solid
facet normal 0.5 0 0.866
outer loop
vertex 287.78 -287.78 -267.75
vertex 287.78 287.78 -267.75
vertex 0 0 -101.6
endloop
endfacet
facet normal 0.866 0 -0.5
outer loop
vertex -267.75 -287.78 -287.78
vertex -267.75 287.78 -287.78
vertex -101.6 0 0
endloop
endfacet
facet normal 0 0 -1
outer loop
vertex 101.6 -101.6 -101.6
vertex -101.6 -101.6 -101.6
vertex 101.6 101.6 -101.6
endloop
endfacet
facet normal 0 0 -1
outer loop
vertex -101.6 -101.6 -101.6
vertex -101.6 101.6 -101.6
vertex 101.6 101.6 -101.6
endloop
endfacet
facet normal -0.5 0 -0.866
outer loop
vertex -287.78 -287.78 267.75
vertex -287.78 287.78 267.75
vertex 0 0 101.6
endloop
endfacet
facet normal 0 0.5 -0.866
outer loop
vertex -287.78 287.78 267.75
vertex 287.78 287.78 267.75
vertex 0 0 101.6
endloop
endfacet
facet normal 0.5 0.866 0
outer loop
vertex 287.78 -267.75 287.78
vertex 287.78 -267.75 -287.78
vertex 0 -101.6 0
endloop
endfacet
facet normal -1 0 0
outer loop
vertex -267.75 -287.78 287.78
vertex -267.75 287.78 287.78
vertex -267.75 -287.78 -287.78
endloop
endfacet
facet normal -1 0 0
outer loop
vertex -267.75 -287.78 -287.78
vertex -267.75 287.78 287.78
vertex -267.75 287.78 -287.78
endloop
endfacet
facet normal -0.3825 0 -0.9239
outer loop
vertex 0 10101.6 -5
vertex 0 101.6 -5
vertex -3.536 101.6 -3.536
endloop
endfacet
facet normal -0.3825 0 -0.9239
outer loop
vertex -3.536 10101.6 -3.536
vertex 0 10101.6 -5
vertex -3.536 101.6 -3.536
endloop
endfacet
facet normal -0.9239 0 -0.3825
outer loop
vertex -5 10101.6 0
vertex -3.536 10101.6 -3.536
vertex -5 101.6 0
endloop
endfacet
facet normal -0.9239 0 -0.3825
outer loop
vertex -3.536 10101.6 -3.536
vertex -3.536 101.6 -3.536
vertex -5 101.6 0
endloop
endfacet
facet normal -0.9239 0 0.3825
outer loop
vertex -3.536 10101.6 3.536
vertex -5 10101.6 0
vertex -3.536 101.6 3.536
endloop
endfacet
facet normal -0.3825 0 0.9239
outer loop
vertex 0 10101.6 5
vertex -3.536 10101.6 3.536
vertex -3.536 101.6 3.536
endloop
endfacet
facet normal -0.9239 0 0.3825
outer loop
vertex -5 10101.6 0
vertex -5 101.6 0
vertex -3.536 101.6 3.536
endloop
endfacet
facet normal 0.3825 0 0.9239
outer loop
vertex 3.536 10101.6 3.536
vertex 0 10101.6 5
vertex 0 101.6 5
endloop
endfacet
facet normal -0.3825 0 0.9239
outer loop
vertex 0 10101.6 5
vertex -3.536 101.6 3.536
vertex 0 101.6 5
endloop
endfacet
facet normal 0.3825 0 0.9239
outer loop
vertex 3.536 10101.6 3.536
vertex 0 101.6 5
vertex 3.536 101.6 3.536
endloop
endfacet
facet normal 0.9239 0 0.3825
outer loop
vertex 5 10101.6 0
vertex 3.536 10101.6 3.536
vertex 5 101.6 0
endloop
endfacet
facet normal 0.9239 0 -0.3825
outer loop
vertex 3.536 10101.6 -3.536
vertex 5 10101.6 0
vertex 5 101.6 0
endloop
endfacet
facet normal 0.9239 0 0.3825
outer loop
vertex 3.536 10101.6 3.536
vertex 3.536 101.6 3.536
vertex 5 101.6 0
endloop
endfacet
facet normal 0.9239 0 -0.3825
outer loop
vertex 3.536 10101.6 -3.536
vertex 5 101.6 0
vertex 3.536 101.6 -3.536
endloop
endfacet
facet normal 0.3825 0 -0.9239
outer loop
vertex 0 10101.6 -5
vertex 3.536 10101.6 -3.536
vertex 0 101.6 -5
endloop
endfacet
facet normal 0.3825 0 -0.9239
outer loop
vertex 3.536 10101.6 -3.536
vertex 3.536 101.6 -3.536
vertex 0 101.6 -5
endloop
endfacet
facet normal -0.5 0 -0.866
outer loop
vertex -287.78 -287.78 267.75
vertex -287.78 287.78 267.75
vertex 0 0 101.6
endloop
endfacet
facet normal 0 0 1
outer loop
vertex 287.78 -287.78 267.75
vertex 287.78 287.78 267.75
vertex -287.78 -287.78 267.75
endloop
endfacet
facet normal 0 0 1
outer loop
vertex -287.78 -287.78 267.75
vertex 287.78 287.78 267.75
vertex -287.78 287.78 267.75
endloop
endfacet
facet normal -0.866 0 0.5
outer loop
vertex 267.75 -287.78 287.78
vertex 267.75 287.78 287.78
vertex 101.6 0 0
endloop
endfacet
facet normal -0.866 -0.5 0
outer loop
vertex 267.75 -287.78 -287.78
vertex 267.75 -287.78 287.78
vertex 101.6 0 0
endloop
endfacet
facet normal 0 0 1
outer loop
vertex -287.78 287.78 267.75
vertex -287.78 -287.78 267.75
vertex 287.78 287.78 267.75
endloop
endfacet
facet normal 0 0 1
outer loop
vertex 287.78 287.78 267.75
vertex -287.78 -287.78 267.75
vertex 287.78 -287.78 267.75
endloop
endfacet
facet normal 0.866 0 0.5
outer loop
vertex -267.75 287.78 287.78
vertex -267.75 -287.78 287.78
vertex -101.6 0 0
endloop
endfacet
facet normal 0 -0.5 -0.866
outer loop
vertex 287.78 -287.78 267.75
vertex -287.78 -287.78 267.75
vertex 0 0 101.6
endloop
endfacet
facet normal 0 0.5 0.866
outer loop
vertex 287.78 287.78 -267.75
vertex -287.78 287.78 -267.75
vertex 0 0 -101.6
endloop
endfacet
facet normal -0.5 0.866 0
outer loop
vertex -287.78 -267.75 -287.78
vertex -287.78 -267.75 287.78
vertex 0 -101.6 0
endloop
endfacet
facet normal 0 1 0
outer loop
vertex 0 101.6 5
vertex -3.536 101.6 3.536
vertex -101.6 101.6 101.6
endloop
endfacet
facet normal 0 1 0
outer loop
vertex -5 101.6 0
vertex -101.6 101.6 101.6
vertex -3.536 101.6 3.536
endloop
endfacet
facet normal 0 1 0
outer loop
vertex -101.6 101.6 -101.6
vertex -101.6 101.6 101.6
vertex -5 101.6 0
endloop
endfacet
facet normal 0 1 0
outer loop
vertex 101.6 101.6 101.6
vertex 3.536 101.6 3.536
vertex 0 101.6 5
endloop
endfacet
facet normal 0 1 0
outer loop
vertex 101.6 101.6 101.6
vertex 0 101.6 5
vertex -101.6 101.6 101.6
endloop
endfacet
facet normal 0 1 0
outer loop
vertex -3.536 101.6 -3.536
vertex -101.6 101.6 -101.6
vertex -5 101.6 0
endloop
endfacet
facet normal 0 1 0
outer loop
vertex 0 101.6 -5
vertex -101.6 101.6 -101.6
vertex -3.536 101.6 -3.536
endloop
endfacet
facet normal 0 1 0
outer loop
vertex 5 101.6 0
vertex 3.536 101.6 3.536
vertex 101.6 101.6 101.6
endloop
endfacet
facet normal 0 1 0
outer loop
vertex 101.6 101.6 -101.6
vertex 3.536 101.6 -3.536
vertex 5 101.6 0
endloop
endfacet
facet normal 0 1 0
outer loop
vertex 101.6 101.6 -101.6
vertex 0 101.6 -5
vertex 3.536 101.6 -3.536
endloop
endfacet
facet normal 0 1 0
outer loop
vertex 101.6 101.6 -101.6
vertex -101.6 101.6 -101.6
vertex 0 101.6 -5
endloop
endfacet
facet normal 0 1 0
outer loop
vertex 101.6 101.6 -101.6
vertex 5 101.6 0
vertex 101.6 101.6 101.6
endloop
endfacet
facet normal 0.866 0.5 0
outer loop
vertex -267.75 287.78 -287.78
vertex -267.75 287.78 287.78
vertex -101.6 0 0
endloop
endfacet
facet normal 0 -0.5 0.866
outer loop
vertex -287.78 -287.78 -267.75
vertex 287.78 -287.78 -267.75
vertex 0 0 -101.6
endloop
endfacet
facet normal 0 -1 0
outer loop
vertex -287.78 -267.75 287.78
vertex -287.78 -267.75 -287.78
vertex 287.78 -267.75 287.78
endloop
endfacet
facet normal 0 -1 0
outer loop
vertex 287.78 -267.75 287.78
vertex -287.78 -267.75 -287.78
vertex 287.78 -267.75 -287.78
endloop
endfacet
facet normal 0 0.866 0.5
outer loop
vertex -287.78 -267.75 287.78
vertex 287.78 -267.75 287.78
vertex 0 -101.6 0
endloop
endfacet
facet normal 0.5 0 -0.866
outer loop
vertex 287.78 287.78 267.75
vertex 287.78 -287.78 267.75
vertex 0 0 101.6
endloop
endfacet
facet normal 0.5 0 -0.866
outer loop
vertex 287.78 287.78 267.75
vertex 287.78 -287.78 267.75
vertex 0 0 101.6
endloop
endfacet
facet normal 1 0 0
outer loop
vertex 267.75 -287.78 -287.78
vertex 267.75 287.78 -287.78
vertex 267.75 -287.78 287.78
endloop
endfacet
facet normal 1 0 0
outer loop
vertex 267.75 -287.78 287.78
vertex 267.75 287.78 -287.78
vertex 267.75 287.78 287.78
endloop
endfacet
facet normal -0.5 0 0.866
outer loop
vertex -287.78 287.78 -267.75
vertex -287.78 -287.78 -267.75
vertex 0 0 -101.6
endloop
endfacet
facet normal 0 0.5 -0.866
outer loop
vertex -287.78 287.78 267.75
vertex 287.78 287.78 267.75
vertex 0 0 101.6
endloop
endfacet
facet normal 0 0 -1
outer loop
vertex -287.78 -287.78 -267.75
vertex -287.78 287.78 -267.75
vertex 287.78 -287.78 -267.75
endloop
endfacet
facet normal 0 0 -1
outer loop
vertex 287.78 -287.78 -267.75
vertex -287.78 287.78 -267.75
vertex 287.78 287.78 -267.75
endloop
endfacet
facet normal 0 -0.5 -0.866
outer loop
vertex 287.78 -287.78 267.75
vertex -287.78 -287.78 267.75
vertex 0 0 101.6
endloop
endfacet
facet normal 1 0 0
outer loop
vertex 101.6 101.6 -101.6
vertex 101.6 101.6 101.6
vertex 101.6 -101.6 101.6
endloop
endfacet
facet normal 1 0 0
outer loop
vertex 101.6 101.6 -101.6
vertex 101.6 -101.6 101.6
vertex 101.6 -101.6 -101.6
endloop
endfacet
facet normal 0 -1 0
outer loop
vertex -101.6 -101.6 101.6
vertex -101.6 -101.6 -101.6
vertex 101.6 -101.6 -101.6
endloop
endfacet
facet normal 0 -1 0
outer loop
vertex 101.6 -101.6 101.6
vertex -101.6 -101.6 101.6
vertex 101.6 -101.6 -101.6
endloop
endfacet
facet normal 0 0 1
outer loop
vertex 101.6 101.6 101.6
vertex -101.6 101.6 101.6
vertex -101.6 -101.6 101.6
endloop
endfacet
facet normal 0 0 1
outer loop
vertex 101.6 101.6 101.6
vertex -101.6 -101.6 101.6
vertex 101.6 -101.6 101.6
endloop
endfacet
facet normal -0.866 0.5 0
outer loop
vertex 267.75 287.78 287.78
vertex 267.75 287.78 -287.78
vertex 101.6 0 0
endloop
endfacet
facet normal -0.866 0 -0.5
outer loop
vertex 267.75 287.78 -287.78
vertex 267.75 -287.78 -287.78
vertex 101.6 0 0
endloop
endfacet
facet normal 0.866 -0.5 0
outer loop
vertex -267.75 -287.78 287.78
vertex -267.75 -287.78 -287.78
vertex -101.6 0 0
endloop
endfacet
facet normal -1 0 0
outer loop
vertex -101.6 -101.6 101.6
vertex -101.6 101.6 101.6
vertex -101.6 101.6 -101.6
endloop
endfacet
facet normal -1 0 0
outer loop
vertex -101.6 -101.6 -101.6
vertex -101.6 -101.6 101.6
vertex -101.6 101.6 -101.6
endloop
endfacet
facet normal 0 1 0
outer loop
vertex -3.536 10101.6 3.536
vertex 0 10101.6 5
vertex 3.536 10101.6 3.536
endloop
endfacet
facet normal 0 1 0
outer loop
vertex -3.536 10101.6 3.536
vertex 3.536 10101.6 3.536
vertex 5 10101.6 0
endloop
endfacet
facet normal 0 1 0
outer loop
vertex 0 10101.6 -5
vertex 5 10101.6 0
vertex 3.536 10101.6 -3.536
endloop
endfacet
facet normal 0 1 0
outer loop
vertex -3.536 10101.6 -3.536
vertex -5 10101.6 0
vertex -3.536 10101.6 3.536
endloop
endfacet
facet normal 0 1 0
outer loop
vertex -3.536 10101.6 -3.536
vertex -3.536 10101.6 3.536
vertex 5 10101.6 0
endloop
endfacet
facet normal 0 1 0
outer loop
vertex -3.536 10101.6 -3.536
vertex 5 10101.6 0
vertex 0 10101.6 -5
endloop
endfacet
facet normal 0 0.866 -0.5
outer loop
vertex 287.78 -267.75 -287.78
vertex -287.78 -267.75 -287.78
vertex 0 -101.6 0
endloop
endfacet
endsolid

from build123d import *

# Parameters (mm, degrees)
SKETCH1_W           = 203.2
SKETCH1_H           = 203.2
BOSS_EXTRUDE1_DEPTH = 101.6
LOFT1_OUTLINE_W     = 575.560177182
LOFT1_OUTLINE_H     = 575.560177182
LOFT1_DEPTH         = 166.149911615
LOFT1_TAPER         = 60
CIRPATTERN1_COUNT   = 3
CIRPATTERN1_ANGLE   = 180
CIRPATTERN2_COUNT   = 4
SKETCH7_R           = 5
BOSS_EXTRUDE2_DEPTH = 10000


# Read off the part's stored shape, not the designer's step: Loft1
with BuildPart() as part:
    # Sketch1 → Boss-Extrude1 (new, symmetric)
    with BuildSketch(Plane(origin=(0, 0, 0), x_dir=(1, 0, 0), z_dir=(0, 1, 0))):
        Rectangle(SKETCH1_W, SKETCH1_H)
    extrude(amount=BOSS_EXTRUDE1_DEPTH, both=True)

    # Sketch7 → Boss-Extrude2 (add)
    with BuildSketch(Plane(origin=(0, 101.6, 0), x_dir=(1, 0, 0), z_dir=(0, 1, 0))):
        with Locations(Location((0, 0, 0), (0, 0, 90))):
            Circle(SKETCH7_R)
    extrude(amount=BOSS_EXTRUDE2_DEPTH)


with BuildPart() as body_2:
    # Loft1 outline → Loft1 (new body)
    with BuildSketch(Plane.XY.offset(-267.749911615)):
        Rectangle(LOFT1_OUTLINE_W, LOFT1_OUTLINE_H)
    extrude(amount=LOFT1_DEPTH, taper=LOFT1_TAPER)


with BuildPart() as cirpattern1_1:
    # CirPattern1: pattern copy
    add(body_2.part.rotate(Axis((0, 0, 0), (-1, 0, 0)), 1 * CIRPATTERN1_ANGLE / (CIRPATTERN1_COUNT - 1)))


with BuildPart() as cirpattern1_2:
    # CirPattern1: pattern copy
    add(body_2.part.rotate(Axis((0, 0, 0), (-1, 0, 0)), 2 * CIRPATTERN1_ANGLE / (CIRPATTERN1_COUNT - 1)))


with BuildPart() as cirpattern2_1:
    # CirPattern2: pattern copy
    add(body_2.part.rotate(Axis((0, 0, 0), (0, 1, 0)), 1 * 360 / CIRPATTERN2_COUNT))


with BuildPart() as cirpattern2_2:
    # CirPattern2: pattern copy
    add(body_2.part.rotate(Axis((0, 0, 0), (0, 1, 0)), 2 * 360 / CIRPATTERN2_COUNT))


with BuildPart() as cirpattern2_3:
    # CirPattern2: pattern copy
    add(body_2.part.rotate(Axis((0, 0, 0), (0, 1, 0)), 3 * 360 / CIRPATTERN2_COUNT))


solid = Compound([part.part, body_2.part, cirpattern1_1.part, cirpattern1_2.part, cirpattern2_1.part, cirpattern2_2.part, cirpattern2_3.part])
